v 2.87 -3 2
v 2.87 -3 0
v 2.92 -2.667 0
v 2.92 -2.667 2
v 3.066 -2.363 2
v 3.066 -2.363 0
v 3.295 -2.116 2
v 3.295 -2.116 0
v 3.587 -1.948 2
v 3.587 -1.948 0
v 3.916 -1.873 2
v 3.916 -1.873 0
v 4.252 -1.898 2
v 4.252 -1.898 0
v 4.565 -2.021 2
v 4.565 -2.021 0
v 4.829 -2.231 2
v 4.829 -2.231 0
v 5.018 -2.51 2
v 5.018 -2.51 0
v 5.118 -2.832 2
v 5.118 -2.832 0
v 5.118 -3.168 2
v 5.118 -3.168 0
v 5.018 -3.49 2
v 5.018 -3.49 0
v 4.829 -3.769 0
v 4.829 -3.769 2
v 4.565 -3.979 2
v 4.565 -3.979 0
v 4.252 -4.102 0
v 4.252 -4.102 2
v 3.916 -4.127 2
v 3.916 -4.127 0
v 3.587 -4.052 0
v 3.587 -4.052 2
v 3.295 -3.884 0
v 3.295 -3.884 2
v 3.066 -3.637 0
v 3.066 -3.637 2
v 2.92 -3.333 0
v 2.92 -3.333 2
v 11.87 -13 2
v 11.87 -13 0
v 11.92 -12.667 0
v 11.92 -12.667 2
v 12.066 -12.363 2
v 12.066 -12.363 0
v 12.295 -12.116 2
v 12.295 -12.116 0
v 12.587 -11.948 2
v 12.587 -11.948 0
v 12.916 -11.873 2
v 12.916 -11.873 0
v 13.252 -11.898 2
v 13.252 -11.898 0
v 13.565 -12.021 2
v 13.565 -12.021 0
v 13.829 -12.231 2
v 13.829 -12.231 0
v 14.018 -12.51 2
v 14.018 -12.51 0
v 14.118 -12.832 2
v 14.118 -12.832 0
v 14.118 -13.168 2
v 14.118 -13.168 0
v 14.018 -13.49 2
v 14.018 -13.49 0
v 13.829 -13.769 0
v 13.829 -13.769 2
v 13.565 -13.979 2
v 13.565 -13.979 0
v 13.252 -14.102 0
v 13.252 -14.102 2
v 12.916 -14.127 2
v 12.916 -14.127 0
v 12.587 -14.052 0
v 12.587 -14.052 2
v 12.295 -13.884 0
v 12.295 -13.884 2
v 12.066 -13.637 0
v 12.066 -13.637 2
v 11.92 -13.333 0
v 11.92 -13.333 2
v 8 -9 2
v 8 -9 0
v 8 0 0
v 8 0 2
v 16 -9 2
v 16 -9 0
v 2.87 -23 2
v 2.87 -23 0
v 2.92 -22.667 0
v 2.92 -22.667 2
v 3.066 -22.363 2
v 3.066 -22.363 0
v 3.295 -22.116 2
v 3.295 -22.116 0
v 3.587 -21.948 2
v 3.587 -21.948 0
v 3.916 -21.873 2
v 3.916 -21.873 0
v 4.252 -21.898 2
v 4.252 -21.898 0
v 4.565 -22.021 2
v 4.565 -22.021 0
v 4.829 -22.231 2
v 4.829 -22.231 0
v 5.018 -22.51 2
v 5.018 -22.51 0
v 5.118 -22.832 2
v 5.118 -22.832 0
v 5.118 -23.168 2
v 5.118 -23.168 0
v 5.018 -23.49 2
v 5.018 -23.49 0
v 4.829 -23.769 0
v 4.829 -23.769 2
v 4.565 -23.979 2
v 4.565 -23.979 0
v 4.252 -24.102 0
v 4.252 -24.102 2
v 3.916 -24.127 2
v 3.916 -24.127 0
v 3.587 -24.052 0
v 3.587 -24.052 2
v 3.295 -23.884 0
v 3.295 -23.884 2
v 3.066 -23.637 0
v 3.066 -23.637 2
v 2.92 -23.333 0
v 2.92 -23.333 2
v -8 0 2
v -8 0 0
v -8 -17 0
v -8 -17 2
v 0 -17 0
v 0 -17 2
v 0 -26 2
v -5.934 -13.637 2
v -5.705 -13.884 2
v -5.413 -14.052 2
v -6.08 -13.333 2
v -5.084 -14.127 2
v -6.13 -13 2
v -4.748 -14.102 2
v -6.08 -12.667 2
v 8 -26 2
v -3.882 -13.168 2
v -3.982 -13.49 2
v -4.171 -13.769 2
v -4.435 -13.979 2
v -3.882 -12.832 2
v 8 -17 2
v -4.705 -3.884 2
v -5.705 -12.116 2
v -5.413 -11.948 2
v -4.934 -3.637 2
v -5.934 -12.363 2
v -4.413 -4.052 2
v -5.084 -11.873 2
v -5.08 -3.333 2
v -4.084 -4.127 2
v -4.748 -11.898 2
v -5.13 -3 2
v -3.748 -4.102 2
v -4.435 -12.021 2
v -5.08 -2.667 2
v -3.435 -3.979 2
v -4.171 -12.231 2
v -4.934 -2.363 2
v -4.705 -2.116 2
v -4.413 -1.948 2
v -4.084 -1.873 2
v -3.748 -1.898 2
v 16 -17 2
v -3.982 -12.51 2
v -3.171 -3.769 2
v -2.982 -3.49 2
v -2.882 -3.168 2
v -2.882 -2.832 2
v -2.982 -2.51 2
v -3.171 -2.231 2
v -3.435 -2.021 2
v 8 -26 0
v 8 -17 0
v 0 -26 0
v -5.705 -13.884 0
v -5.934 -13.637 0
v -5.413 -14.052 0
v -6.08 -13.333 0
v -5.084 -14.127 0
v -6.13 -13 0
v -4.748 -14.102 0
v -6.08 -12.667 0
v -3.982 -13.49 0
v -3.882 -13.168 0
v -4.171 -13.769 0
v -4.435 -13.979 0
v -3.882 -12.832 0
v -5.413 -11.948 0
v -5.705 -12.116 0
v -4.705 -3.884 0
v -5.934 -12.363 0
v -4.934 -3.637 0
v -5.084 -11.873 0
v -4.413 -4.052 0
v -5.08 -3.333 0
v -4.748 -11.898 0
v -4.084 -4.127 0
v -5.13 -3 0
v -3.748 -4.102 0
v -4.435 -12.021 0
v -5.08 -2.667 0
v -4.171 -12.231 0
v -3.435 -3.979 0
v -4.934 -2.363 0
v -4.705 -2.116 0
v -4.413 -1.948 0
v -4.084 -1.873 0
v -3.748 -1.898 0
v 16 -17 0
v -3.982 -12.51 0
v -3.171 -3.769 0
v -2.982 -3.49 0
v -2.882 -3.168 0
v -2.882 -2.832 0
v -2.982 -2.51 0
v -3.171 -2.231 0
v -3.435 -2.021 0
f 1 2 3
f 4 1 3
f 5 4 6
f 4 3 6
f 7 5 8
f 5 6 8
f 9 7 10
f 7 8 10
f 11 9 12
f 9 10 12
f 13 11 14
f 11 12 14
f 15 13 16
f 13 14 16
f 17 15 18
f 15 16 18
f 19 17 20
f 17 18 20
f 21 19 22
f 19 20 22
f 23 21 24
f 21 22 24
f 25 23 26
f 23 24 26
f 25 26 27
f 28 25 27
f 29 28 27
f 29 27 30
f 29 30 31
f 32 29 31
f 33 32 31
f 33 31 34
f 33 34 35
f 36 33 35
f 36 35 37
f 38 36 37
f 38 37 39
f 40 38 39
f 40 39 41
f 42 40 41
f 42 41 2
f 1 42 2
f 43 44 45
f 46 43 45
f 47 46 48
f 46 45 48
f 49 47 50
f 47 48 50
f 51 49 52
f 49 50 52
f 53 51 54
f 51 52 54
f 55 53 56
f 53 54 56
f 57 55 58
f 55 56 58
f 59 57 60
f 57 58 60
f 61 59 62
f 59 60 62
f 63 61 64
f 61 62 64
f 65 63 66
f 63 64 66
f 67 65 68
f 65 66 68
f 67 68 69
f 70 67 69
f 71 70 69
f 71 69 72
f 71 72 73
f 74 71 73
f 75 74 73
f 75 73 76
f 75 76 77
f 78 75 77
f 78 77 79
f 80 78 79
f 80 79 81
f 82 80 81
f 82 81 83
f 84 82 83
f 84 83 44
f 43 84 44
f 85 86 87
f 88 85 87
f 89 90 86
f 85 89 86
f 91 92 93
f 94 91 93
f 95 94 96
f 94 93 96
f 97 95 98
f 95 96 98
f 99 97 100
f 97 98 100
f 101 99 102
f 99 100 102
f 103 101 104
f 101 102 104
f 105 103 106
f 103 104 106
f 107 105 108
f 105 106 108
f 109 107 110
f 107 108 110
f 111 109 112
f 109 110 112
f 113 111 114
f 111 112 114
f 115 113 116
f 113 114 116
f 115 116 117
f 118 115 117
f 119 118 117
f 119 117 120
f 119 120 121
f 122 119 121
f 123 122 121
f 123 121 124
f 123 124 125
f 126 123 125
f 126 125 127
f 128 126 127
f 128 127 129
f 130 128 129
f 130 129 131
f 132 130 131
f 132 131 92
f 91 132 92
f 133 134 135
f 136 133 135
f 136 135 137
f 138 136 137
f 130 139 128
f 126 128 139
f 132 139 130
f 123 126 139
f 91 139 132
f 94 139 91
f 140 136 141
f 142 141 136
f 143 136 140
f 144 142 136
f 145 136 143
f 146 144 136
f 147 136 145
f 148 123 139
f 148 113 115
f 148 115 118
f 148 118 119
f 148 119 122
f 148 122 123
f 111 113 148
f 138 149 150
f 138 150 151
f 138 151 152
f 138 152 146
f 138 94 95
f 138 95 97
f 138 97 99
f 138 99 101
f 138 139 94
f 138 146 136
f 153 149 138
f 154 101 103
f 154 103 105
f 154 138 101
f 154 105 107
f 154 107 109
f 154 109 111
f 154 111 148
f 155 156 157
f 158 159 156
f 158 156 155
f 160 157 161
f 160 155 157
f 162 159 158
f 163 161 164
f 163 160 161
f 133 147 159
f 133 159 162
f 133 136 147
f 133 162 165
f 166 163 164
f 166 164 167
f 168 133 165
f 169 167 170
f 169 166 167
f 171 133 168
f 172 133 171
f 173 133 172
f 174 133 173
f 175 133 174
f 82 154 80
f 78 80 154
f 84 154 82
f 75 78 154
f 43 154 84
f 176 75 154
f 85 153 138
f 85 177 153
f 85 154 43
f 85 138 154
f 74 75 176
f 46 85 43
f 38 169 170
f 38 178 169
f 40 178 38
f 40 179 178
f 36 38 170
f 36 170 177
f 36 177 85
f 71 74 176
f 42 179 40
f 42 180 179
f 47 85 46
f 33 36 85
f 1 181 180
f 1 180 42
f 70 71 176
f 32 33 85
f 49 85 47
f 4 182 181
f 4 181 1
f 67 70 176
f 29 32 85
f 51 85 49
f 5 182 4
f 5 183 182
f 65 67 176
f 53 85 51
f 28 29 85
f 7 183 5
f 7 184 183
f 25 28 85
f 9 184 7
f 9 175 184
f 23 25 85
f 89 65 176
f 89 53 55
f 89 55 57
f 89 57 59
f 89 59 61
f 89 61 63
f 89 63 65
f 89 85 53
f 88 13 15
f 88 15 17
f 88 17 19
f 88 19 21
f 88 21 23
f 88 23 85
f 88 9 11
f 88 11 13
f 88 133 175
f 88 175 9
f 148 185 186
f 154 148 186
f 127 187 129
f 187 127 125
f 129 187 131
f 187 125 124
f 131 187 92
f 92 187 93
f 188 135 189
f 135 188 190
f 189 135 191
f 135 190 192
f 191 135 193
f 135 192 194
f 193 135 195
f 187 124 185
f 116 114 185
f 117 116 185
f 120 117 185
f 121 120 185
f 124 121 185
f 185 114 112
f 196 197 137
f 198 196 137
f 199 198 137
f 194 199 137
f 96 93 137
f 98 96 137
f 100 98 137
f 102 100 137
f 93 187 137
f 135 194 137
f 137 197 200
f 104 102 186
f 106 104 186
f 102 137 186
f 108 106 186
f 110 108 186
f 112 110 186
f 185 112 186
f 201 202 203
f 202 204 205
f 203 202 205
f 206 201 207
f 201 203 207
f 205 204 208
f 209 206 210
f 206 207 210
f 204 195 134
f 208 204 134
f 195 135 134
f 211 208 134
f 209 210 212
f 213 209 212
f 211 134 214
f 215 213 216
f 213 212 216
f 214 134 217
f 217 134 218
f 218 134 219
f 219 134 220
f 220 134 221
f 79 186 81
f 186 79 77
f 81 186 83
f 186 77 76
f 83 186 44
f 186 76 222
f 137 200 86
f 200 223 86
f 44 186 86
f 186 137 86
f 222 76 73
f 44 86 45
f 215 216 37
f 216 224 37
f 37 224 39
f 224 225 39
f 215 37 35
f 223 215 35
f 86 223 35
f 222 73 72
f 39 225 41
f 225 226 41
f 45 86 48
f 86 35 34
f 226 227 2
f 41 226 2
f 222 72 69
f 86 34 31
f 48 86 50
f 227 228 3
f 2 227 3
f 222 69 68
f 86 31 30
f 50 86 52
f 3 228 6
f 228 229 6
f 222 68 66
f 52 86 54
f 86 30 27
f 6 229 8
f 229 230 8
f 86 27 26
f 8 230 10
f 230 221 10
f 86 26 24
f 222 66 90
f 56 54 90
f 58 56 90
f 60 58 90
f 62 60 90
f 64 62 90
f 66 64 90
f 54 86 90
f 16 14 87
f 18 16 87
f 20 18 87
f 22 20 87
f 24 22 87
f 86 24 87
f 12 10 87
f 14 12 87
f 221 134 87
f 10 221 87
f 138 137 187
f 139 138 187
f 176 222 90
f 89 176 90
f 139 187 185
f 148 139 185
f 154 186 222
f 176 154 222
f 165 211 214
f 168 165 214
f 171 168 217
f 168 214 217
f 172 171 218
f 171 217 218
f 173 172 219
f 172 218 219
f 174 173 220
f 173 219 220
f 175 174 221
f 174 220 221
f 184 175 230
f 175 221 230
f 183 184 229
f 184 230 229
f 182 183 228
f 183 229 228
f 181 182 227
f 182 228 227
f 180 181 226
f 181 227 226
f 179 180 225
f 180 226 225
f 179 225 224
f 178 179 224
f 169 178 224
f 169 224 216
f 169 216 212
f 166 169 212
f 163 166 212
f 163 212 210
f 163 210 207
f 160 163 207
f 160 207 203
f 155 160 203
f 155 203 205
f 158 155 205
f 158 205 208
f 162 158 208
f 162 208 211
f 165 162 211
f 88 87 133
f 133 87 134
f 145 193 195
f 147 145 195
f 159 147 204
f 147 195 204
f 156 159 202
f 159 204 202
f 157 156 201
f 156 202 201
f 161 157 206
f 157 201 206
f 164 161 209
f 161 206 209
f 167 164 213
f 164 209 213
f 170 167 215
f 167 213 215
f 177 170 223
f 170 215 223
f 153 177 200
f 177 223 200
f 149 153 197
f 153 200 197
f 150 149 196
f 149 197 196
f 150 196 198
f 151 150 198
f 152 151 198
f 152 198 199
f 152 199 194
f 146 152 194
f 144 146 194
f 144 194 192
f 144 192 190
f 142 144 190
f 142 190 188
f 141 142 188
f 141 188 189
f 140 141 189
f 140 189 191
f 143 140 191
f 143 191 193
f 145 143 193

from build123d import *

# Parameters (mm, degrees)
SKETCH3_R             = 1
BOSS_EXTRUDE1_DEPTH   = 2
F_4_40_TAPPED_HOLE1_D = 2.2606


with BuildPart() as part:
    # Sketch3 → Boss-Extrude1 (new body)
    with BuildSketch(Plane.XY):
        Polygon((8, 0), (-8, 0), (-8, -17), (0, -17), (0, -26), (8, -26), (8, -17), (16, -17), (16, -9), (8, -9), align=None)
        with Locations((4, -3)):
            Circle(SKETCH3_R, mode=Mode.SUBTRACT)
        with Locations((-4, -3)):
            Circle(SKETCH3_R, mode=Mode.SUBTRACT)
        with Locations((-5, -13)):
            Circle(SKETCH3_R, mode=Mode.SUBTRACT)
        with Locations((13, -13)):
            Circle(SKETCH3_R, mode=Mode.SUBTRACT)
        with Locations((4, -23)):
            Circle(SKETCH3_R, mode=Mode.SUBTRACT)
    extrude(amount=BOSS_EXTRUDE1_DEPTH)

    # #4-40 Tapped Hole1 (through all)
    with Locations(Plane(origin=(-5, -13, 2), x_dir=(1, 0, 0), z_dir=(0, 0, 1))):
        with Locations((0, 0), (18, 0), (9, -10), (9, 10), (1, 10)):
            Hole(F_4_40_TAPPED_HOLE1_D / 2)


solid = part.part
